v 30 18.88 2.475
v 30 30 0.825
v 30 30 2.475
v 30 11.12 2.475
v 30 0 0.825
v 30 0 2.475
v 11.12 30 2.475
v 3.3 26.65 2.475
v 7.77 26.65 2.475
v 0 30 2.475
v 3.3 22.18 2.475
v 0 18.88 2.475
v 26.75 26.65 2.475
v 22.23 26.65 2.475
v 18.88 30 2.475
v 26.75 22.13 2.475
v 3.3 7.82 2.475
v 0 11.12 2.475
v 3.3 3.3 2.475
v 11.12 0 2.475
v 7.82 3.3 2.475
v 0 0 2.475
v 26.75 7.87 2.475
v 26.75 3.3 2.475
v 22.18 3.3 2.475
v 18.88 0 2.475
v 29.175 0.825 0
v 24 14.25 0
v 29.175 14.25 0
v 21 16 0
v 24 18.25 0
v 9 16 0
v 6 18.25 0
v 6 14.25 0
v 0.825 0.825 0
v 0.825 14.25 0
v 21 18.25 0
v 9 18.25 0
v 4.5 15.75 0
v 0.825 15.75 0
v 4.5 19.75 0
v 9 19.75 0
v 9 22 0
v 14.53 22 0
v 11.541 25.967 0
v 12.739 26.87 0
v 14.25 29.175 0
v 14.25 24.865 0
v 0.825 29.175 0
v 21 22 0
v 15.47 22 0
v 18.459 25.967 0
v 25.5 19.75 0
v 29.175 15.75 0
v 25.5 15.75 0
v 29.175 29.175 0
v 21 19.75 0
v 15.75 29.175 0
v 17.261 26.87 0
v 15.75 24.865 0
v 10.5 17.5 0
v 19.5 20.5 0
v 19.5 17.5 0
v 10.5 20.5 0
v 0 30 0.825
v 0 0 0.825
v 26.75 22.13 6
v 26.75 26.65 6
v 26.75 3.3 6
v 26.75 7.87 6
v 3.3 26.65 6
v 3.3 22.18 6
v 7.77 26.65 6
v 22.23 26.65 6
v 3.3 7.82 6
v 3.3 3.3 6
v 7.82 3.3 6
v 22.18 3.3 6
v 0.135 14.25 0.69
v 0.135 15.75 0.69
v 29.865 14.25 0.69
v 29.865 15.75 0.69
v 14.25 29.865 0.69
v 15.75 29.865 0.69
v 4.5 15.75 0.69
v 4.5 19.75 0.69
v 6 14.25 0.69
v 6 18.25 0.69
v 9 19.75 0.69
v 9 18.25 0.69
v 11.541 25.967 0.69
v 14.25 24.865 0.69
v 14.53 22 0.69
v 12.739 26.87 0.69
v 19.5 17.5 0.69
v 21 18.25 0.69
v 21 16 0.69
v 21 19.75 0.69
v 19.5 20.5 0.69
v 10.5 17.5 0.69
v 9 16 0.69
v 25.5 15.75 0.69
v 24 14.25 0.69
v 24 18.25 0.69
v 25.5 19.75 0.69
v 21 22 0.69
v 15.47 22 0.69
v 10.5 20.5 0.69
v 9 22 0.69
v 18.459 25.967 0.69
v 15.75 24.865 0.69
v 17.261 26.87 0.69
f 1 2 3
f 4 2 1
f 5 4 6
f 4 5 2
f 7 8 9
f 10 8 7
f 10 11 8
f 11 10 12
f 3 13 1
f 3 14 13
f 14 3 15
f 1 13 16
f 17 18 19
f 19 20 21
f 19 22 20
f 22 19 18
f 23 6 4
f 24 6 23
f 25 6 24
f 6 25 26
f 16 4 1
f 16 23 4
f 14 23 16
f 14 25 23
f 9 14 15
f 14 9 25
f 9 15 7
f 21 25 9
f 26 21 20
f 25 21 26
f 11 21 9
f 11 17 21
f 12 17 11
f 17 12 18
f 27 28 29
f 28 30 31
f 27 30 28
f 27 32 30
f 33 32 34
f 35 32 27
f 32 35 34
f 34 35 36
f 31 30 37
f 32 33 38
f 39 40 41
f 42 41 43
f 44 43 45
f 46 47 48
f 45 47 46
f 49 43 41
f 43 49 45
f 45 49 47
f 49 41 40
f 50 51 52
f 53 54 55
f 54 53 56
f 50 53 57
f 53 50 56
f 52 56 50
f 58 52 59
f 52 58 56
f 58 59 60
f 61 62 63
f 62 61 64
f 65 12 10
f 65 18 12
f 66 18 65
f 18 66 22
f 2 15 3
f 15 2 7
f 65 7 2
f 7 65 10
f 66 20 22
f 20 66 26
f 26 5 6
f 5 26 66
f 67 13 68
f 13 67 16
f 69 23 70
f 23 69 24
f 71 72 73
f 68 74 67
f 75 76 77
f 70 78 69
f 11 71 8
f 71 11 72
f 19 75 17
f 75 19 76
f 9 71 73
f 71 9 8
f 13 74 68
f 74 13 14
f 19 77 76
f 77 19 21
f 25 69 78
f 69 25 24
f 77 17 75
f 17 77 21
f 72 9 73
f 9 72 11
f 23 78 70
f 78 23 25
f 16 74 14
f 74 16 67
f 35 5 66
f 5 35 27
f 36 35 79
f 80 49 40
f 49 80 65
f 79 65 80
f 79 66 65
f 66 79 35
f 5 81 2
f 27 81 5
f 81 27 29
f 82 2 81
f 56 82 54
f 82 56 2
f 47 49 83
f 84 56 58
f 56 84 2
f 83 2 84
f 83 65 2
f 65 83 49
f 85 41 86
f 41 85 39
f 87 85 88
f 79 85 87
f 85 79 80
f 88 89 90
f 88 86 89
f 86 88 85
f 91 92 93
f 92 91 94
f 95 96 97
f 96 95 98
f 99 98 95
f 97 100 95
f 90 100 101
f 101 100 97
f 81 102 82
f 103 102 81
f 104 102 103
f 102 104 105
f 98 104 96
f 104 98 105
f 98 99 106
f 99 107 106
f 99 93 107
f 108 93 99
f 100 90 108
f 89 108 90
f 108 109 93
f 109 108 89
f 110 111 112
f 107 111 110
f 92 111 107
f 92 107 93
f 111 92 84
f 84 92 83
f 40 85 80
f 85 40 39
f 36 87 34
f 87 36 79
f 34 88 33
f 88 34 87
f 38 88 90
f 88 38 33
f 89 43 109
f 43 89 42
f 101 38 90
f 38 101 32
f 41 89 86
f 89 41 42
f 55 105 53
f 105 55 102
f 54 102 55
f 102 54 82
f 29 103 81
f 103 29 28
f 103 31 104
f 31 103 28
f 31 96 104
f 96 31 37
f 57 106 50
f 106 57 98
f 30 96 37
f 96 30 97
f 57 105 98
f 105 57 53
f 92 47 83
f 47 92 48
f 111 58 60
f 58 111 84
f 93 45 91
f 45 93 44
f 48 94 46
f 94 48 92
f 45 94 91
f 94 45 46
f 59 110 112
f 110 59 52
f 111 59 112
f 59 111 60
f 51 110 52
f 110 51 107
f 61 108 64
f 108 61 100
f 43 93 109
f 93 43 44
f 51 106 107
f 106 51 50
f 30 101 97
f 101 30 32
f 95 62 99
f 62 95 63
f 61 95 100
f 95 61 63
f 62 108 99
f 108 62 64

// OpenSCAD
// file: sym_arrow.scad
module arrow(thickness, length, size, height)
{
    translate([thickness,-thickness/2])cube([length-thickness, thickness, height]);
    rotate([0,0,37])translate([0,-3*thickness/4])cube([size, thickness, height]);
    rotate([0,0,-37])translate([0,-thickness/4])cube([size, thickness, height]);
}

//arrow(0.7, 20, 4.5, 1);
// file: settings.scad
cube_width=30;
cube_height=16;
cube_thickness=3.3;

cap_width=30;
cap_height=6;
cap_thickness=3.3;

glyph_depth=0.7;
glyph_thickness=1.5;

photo_resitor_hole_r = 2.4;
spring_contact_hole_r = 3.125;
// file: sym_resistor_potentiometer.scad
use <sym_arrow.scad>
include <settings.scad>

module wire(length, width, elevation, thickness, height)
{
    //left wire left
    translate([0,-thickness/2,0])cube([(length/2-width)/2, thickness, height]);
    
    //left vertical wire
    translate([(length/2-width)/2, -thickness/2, 0]) cube([thickness, elevation, height]);
    
    //left wire right
    translate([(length/2-width)/2,elevation-thickness/2,0])cube([(length/2-width)/2, thickness, height]);
}

module resistor_potentiometer(length, width, elevation, thickness, height)
{
    //left wire
    wire(length, width, elevation, thickness, height);
    
    //right wire
    translate([length, 0,0])mirror([1,0,0])wire(length, width, elevation, thickness, height);
  
    translate([0,elevation,0])
    {
        //left vertical bar
        translate([length/2-width,-width/2, 0])cube([thickness, width, height]);
    
        //right vertical bar
        translate([length/2+width-thickness,-width/2,0])cube([thickness, width, height]);
    
        //bottom horizontal bar
        translate([length/2-width,-width/2, 0])cube([2*width, thickness, height]);
    
        //top horizontal bar
        translate([length/2-width, width/2-thickness, 0])cube([2*width, thickness, height]);
    
        //arrow
        translate([length/2,width/2,0]) rotate([0,0,90])arrow(glyph_thickness, length/2, thickness*3.5, height);
    }
        
}

resistor_potentiometer(30, 8, 10, glyph_thickness, glyph_height);
// file: cap_1x1.scad
include <settings.scad>

module cap_1x1(width, height, thickness, holes_mask)
{
    width1=width-thickness;
    difference()
    {
        union()
        {
            cube([width, width, thickness*3/4]);
            translate([thickness,thickness,0])cube([width-2*(thickness-0.025), width-2*(thickness+0.025), height]);
        }
        union()
        {
            translate([width/2,width/2,0])rotate([0,0,45])translate([-width1/2,-width1/2,thickness*3/4]) cube([width1,width1,height]);
                        //corners
            translate([0,0.25*thickness,0])rotate([45,0,0]) translate([-0.5*width, -width, -0.5*height]) cube([2*width, width, 2*height]);
            translate([0.25*thickness,0,0]) rotate([0,-45,0]) translate([-width, -0.5*width, -0.5*height]) cube([width, 2*width, 2*height]);
            translate([width-0.25*thickness,0,0]) rotate([0,45,0]) translate([0, 0, -0.5*height]) cube([width, 2*width, 2*height]);
            translate([0,width-0.25*thickness,0]) rotate([-45,0,0]) translate([-0.5*width, 0, -0.5*height]) cube([2*width, width, 2*height]);
            
            if (holes_mask >= 8)
            {
                translate([width/2, thickness-1.5, -0.5]) cylinder(r=1.15, h=height*1.5, $fn=80);
            }
            if ((holes_mask%8) >= 4)
            {
                translate([width/2, width-thickness+1.5, -0.5]) cylinder(r=1.15, h=height*1.5, $fn=80);
            }
            if ((holes_mask%4)>= 2)
            {
                translate([thickness-1.5, width/2, -0.5]) cylinder(r=1.15, h=height*1.5, $fn=80);
            }
            if (holes_mask%2 >= 1)
            {
                translate([width-thickness+1.5, width/2, -0.5]) cylinder(r=1.15, h=height*1.5, $fn=80);
            }
        }
    }
}

cap_1x1(cap_width, cap_height, cap_thickness, 9);
//ring(10,1,1);
//arrow(1, 20, 3, 1);
//transistor_npn(30, 1, 1);
// main file
use <cap_1x1.scad>
use <sym_resistor_potentiometer.scad>
include <settings.scad>

module cap_1x1_resistor_potentiometer(width, height, thickness)
{
    difference()
    {
        cap_1x1(width, height, thickness, 0);
        translate([0,width/2,-0.01])resistor_potentiometer(width, width/5, 4, glyph_thickness, glyph_depth);
    }
}

cap_1x1_resistor_potentiometer(cap_width, cap_height, cap_thickness);
